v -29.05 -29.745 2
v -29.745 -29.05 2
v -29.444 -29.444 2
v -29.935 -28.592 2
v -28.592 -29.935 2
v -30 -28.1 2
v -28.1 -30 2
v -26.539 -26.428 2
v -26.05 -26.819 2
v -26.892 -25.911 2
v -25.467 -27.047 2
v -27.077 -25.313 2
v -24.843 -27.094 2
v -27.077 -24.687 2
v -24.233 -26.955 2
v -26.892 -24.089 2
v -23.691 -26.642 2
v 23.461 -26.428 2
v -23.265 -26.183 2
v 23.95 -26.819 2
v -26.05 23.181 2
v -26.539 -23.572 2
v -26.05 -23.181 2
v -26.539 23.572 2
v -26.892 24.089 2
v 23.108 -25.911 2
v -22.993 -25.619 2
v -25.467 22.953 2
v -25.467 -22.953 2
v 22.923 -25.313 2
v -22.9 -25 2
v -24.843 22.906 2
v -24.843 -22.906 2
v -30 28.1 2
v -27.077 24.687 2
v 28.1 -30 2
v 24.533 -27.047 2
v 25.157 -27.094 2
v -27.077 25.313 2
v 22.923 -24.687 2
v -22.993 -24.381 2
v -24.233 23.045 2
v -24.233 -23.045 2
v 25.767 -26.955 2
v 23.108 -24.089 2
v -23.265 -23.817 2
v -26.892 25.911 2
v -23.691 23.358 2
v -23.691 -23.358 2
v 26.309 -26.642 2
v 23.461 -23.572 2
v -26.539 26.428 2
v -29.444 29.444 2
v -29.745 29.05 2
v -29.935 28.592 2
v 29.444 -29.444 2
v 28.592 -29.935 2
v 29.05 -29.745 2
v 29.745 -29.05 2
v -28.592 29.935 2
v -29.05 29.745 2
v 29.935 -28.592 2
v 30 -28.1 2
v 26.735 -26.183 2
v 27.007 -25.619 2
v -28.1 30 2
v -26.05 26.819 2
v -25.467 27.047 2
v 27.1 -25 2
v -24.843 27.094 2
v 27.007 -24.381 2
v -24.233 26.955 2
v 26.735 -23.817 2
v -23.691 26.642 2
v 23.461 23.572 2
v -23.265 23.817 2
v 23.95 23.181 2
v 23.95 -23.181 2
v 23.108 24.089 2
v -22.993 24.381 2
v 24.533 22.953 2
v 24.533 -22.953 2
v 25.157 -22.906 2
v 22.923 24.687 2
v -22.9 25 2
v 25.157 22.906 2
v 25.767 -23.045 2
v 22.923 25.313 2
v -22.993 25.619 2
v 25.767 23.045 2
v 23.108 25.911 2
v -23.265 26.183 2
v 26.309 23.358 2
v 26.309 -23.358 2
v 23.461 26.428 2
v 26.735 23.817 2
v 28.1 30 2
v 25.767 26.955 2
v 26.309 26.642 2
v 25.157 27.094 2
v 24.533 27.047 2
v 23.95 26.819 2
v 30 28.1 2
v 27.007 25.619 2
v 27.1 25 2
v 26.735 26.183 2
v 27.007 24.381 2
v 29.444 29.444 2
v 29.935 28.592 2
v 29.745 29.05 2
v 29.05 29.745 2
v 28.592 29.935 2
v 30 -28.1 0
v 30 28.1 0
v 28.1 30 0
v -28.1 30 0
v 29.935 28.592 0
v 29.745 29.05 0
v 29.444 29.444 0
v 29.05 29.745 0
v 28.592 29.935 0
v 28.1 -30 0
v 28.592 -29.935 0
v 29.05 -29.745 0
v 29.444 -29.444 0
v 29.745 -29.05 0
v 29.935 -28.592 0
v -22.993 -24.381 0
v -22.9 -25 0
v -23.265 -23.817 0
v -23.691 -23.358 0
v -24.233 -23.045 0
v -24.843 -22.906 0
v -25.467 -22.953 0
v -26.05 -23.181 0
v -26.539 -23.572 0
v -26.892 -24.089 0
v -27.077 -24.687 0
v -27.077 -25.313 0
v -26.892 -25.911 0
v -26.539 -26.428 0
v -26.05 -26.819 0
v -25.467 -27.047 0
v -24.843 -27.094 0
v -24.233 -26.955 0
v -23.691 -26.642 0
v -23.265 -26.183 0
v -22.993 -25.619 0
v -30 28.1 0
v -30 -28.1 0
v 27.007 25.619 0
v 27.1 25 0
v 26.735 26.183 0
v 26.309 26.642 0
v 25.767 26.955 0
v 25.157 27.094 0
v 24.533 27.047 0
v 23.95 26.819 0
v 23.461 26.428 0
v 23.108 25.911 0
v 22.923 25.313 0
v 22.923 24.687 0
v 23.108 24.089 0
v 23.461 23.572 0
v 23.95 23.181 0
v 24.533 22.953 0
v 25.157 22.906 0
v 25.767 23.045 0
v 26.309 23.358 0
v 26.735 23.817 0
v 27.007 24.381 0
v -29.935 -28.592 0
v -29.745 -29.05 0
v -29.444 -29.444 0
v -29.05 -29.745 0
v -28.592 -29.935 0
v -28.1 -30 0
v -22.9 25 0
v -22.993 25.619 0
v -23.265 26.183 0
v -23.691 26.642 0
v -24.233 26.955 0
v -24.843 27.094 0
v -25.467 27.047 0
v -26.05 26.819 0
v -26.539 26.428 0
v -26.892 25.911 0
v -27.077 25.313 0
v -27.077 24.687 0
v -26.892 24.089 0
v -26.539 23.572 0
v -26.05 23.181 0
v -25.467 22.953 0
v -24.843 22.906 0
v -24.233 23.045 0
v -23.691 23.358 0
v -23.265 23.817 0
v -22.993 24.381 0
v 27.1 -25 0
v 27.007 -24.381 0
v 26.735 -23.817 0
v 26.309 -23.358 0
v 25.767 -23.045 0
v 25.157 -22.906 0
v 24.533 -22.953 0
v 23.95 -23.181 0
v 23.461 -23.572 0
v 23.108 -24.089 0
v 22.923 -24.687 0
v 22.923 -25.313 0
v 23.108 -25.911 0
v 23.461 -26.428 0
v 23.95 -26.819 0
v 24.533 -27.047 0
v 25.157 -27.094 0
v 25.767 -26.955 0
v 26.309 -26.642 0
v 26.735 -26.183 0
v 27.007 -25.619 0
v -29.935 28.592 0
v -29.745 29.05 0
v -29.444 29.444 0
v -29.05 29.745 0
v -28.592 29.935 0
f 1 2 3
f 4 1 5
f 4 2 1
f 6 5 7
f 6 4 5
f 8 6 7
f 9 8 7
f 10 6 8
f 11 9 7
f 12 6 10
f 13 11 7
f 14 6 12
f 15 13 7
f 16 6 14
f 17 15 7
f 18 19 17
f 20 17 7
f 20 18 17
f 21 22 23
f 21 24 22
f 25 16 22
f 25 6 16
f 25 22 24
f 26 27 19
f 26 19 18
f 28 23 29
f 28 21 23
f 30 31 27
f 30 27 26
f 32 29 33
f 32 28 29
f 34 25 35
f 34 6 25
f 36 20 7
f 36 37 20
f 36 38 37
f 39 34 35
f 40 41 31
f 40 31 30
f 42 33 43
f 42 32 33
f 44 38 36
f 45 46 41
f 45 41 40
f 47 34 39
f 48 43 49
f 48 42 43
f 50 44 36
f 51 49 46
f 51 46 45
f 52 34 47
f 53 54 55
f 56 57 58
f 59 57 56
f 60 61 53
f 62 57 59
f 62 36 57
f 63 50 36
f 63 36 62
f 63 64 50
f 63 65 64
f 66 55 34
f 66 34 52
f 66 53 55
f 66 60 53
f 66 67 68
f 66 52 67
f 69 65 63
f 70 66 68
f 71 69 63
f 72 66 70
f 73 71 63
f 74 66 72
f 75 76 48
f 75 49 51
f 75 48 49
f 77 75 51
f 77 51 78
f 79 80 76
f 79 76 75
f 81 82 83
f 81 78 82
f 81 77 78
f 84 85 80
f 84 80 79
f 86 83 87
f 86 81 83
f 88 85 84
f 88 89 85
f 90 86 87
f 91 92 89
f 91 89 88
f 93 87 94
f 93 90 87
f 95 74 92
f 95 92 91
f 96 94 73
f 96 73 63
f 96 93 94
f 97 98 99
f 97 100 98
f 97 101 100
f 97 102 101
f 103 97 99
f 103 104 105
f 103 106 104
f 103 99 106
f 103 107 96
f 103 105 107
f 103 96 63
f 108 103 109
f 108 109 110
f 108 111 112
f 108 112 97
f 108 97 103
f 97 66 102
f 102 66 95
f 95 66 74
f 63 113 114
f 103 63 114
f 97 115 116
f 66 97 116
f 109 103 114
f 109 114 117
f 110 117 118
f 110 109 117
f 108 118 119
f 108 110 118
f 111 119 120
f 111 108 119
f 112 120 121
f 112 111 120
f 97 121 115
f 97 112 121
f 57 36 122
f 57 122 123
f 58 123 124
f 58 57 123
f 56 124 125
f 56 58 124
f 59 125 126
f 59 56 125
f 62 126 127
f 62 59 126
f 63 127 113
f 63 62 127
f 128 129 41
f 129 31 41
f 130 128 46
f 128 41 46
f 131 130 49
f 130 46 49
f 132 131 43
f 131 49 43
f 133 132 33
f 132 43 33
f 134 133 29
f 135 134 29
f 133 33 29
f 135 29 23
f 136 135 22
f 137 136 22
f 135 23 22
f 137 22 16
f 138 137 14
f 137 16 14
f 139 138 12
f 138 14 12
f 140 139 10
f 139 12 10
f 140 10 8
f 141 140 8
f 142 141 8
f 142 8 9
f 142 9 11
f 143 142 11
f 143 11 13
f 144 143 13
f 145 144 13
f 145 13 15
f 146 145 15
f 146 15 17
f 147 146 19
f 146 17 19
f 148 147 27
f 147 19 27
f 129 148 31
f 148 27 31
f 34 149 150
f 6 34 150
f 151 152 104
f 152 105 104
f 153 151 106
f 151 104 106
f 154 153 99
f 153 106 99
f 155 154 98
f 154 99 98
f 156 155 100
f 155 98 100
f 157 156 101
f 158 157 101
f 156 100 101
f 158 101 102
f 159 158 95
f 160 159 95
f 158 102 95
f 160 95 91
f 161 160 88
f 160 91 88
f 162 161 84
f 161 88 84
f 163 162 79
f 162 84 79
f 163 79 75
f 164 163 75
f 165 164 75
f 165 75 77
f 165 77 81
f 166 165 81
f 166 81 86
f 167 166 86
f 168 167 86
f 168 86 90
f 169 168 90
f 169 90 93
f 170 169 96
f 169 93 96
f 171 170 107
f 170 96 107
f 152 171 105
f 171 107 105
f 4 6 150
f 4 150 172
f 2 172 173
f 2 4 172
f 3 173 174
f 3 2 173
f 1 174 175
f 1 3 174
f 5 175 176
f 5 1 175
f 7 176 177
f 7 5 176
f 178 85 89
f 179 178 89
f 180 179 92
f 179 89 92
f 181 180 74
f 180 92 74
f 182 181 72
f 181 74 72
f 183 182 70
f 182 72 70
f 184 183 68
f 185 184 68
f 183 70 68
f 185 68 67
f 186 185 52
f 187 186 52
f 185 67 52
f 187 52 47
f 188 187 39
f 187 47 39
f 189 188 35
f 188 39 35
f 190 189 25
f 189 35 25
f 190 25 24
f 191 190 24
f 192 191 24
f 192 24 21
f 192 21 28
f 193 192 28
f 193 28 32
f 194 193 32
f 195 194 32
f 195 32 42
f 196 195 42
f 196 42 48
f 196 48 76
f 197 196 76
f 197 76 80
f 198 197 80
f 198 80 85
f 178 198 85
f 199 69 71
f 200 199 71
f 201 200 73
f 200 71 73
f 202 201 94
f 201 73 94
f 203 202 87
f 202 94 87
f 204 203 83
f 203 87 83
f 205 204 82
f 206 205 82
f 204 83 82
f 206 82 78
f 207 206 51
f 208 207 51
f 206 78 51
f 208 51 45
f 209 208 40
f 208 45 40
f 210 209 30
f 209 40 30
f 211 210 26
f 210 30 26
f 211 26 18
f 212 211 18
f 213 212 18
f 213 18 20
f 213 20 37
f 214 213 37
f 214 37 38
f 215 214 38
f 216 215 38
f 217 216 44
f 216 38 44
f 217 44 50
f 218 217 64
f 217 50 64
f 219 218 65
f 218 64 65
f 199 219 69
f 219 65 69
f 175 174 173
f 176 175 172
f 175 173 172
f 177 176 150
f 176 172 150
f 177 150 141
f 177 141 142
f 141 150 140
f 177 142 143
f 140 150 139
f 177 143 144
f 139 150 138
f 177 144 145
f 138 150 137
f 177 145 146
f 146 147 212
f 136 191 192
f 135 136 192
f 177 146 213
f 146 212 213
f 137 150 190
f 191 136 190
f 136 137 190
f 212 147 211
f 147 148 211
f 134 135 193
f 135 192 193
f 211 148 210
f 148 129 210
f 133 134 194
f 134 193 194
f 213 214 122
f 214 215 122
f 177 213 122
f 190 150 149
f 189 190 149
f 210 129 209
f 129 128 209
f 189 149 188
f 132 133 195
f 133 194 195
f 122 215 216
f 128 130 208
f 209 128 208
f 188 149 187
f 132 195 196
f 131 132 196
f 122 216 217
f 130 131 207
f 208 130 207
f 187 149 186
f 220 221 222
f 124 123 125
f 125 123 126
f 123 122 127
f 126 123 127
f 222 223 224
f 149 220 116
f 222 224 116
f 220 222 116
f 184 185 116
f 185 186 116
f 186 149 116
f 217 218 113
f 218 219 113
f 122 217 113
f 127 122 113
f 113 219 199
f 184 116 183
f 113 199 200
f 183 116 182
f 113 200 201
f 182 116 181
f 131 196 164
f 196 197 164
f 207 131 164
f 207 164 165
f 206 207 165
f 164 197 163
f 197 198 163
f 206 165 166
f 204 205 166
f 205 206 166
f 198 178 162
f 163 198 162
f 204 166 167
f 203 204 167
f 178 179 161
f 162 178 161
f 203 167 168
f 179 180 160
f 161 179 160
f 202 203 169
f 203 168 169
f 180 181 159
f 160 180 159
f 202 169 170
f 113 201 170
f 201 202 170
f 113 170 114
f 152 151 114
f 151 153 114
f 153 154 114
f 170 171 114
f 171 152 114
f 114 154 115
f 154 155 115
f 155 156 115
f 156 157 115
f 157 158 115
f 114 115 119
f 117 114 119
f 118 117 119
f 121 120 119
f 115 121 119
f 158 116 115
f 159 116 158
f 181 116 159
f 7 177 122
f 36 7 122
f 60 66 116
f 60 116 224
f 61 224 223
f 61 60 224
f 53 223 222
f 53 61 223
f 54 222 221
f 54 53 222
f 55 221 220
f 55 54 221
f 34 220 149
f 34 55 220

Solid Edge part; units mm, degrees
sketch "Sketch1" plane through (0, 0, 0) normal (0, 0, 1) x (1, 0, 0)
  line L0 (-30, -30) -> (30, -30)
  line L1 (30, -30) -> (30, 30)
  line L2 (30, 30) -> (-30, 30)
  line L3 (-30, 30) -> (-30, -30)
  dimension "D1" = 60
  dimension "D2" = 60
extrude "Protrusion1" add sketch "Sketch1" along normal blind 2
fillet "Congé_1" radius 1.9 4 edges at (30, -30, 1) (-30, -30, 1) (30, 30, 1) (-30, 30, 1)
sketch "Sketch2" plane through (0, 0, 2) normal (0, 0, 1) x (1, 0, 0)
  circle A0 centre (-25, 25) radius 2.1
  circle A1 centre (-25, -25) radius 2.1
  circle A2 centre (25, -25) radius 2.1
  circle A3 centre (25, 25) radius 2.1
  dimension "D1" = 5
  dimension "D2" = 5
  dimension "D3" = 5
  dimension "D4" = 5
  dimension "D5" = 4.2
extrude "Cutout1" cut sketch "Sketch2" against normal up to next
